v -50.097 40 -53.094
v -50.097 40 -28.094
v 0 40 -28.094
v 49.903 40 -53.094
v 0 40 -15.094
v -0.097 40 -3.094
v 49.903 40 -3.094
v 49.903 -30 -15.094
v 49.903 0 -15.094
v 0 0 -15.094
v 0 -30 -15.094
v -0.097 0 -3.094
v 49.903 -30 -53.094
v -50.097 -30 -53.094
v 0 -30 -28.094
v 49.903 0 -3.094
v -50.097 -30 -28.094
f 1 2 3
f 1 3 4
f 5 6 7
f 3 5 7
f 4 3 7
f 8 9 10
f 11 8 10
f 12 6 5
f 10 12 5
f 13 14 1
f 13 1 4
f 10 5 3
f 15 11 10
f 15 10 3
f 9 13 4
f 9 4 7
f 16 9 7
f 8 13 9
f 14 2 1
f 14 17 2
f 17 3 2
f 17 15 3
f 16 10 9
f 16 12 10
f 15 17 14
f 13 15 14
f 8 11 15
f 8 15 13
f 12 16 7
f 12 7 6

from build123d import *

# Parameters (mm, degrees)
F1_DEPTH = 30
F2_DEPTH = 40
F3_DEPTH = 40


with BuildPart() as f1:
    # F0 (on Front) → F1 (new body)
    with BuildSketch(Plane.XZ):
        Polygon((-50.096733, -28.09375), (-50.096733, -53.09375), (49.903267, -53.09375), (49.903267, -15.09375), (0, -15.09375), (0, -28.09375), align=None)
    extrude(amount=F1_DEPTH)

    # F0 (on Front) → F2 (join)
    with BuildSketch(Plane.XZ):
        Polygon((0, -15.09375), (49.903267, -15.09375), (49.903267, -3.09375), (-0.096733, -3.09375), align=None)
    extrude(amount=-F2_DEPTH)

    # F0 (on Front) → F3 (join)
    with BuildSketch(Plane.XZ):
        Polygon((-50.096733, -28.09375), (-50.096733, -53.09375), (49.903267, -53.09375), (49.903267, -15.09375), (0, -15.09375), (0, -28.09375), align=None)
    extrude(amount=-F3_DEPTH)


solid = f1.part
